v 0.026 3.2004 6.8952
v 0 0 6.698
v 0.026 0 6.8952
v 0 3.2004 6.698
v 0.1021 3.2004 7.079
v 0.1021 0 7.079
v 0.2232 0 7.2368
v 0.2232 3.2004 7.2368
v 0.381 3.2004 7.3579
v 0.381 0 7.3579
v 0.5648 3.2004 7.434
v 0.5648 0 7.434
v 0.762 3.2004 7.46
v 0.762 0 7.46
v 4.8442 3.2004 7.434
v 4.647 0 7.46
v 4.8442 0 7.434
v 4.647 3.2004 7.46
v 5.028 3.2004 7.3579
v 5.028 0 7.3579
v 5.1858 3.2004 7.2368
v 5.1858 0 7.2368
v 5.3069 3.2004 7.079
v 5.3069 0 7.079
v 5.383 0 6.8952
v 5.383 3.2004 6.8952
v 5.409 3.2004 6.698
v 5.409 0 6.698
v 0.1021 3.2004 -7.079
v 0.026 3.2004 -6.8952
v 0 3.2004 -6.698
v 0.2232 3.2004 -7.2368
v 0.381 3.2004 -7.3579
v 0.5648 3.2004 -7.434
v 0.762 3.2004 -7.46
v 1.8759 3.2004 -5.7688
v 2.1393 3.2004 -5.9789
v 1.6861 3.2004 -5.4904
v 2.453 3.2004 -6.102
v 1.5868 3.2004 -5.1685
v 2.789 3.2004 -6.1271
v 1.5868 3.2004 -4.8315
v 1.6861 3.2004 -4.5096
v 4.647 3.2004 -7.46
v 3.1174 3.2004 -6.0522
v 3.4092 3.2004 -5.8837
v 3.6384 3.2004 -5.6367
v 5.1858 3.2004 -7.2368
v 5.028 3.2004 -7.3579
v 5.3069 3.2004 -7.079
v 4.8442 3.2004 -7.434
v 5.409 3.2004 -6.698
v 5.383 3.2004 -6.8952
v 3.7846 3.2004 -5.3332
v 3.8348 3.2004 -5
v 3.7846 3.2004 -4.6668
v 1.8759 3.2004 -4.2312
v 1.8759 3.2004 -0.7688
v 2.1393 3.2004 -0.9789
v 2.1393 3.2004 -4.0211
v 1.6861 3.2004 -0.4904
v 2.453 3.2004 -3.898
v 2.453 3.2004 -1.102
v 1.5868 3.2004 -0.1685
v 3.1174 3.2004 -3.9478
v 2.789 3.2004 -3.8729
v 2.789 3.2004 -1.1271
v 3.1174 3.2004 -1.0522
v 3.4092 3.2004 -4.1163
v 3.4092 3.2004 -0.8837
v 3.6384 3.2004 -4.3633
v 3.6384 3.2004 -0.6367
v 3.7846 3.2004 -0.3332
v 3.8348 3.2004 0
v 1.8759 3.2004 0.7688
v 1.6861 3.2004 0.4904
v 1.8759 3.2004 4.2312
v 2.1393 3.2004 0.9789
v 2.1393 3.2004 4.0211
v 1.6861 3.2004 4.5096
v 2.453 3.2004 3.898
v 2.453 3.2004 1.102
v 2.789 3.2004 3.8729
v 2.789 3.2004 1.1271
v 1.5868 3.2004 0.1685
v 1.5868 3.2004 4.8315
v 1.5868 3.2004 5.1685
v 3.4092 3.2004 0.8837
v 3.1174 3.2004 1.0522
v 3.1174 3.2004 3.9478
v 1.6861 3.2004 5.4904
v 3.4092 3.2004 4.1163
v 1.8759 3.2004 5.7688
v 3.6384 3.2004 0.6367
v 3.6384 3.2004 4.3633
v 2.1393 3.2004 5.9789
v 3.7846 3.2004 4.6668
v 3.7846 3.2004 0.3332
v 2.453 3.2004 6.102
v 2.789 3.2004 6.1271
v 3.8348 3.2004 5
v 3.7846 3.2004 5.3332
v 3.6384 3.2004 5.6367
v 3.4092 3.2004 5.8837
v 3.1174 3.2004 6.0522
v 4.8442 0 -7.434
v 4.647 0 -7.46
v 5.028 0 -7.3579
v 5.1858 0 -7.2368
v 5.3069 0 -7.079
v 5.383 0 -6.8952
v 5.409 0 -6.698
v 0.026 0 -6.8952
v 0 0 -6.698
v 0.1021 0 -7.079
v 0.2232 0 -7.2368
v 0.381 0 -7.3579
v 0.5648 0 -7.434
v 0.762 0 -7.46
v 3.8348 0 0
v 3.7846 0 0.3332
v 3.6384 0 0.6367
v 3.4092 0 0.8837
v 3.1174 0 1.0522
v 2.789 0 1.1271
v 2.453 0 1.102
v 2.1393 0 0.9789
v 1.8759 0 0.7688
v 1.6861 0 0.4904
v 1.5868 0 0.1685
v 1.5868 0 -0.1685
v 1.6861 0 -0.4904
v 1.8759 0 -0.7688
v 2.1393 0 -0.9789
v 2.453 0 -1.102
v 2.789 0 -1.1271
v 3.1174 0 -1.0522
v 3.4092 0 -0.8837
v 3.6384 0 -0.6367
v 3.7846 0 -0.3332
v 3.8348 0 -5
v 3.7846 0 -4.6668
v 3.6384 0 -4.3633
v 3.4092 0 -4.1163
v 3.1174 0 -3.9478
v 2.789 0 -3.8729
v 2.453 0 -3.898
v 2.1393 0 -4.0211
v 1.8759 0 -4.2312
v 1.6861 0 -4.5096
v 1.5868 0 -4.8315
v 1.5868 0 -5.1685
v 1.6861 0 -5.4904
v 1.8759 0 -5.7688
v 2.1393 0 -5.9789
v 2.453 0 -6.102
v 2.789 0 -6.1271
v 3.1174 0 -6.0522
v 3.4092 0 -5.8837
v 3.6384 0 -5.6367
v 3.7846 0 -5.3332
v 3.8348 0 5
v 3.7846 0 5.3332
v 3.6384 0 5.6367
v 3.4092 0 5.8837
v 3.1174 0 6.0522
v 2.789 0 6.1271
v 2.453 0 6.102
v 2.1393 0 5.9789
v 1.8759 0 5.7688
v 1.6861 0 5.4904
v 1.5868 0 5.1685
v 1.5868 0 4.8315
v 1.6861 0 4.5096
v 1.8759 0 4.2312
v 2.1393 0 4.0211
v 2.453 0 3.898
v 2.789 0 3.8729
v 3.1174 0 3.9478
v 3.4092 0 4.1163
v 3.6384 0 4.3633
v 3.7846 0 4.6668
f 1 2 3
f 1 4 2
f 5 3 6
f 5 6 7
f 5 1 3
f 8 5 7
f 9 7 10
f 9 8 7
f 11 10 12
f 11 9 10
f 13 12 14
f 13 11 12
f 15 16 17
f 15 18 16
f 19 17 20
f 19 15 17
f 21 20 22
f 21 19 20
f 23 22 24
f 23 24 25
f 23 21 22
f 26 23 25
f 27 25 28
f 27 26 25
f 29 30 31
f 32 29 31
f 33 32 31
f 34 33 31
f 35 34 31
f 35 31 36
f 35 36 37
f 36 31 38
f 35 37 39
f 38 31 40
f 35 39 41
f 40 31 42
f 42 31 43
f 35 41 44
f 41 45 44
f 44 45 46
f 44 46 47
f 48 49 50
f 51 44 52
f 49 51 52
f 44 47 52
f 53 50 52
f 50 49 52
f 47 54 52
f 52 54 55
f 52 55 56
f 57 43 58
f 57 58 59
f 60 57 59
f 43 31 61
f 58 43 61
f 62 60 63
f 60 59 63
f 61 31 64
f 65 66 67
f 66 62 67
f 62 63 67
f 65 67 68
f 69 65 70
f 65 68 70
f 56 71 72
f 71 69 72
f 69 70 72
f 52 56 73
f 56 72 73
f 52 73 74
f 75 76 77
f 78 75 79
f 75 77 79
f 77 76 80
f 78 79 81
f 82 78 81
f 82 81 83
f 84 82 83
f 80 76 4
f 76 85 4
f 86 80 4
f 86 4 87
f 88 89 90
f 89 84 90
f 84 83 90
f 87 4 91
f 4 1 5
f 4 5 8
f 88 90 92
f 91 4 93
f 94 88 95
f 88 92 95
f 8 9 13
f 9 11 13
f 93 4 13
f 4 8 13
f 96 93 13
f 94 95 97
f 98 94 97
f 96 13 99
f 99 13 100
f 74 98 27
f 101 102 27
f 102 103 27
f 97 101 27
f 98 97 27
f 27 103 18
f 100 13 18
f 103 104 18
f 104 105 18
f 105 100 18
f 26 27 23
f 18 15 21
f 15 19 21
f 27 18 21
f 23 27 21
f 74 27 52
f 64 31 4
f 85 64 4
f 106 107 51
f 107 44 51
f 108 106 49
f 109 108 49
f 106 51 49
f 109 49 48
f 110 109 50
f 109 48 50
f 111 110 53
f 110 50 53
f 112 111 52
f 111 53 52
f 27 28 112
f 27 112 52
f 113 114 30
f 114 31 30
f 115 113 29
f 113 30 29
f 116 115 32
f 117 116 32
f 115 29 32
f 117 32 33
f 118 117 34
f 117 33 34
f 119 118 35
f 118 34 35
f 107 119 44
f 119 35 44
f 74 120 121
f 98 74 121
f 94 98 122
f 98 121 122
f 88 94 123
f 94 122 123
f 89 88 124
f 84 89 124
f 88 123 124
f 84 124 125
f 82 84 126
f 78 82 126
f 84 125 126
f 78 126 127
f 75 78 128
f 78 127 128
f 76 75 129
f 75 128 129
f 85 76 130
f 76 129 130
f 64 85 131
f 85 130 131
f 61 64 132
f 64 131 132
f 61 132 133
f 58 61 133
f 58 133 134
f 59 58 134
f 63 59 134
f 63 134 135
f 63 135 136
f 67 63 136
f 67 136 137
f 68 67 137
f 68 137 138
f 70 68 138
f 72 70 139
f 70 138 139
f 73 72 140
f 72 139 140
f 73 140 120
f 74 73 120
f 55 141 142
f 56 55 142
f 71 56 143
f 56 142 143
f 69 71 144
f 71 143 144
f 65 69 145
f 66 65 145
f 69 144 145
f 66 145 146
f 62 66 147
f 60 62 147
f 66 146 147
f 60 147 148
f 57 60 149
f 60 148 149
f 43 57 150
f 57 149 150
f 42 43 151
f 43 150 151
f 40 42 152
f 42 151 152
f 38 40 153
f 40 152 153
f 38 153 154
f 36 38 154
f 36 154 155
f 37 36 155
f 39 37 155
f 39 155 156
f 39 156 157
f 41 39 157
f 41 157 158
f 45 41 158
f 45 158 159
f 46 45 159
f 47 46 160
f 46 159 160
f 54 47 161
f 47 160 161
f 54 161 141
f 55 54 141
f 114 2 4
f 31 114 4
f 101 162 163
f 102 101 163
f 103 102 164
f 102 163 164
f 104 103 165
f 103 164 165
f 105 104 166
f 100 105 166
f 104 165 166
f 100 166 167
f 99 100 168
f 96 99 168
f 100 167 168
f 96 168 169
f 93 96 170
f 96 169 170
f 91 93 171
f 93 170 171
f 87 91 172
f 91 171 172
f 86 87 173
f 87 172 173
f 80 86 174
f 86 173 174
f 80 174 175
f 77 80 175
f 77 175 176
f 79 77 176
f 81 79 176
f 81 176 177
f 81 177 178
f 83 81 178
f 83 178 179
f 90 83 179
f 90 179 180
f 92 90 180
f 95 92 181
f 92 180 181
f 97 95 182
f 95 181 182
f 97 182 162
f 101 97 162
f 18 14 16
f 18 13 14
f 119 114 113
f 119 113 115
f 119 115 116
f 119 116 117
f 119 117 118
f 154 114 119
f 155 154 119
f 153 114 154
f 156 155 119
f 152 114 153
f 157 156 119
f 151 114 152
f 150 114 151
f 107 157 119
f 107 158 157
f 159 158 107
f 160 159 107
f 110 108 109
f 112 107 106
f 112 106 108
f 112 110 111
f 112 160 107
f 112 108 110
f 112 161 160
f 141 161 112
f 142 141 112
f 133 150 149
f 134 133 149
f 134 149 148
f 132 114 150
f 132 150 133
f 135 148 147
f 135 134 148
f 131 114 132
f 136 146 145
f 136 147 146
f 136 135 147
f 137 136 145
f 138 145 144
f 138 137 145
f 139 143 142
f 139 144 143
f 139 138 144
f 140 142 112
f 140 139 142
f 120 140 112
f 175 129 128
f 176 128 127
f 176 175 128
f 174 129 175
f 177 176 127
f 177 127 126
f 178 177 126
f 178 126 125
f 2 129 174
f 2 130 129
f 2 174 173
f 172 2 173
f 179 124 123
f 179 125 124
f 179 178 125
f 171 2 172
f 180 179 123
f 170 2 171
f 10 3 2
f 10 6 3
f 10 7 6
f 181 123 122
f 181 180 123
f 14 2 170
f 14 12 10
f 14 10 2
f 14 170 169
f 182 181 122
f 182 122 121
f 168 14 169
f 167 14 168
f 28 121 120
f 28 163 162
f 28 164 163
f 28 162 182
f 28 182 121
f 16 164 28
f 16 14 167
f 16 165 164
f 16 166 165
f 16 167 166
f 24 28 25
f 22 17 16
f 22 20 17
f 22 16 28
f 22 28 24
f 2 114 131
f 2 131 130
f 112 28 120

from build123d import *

# Parameters (mm, degrees)
SKETCH1_W           = 5.409
SKETCH1_H           = 3.2004
BOSS_EXTRUDE1_DEPTH = 7.459999939
SKETCH3_R           = 1.1303
CUT_EXTRUDE1_DEPTH  = 3.2004
FILLET1_R           = 0.762


with BuildPart() as part:
    # Sketch1 → Boss-Extrude1 (new body, symmetric)
    with BuildSketch(Plane.XY):
        with Locations((2.7045, 1.6002)):
            Rectangle(SKETCH1_W, SKETCH1_H)
    extrude(amount=BOSS_EXTRUDE1_DEPTH, both=True)

    # Sketch3 → Cut-Extrude1 (cut)
    with BuildSketch(Plane.XZ):
        with Locations((2.7045, 4.999999969)):
            Circle(SKETCH3_R)
        with Locations((2.7045, -4.999999969)):
            Circle(SKETCH3_R)
        with Locations((2.7045, 0)):
            Circle(SKETCH3_R)
    extrude(amount=-CUT_EXTRUDE1_DEPTH, mode=Mode.SUBTRACT)

    # Fillet1
    fillet1_edges = [part.edges().sort_by_distance(p)[0] for p in [
        (5.409, 1.6002, 7.459999939),
        (5.409, 1.6002, -7.459999939),
        (0, 1.6002, -7.459999939),
        (0, 1.6002, 7.459999939),
    ]]
    fillet(fillet1_edges, radius=FILLET1_R)


solid = part.part
